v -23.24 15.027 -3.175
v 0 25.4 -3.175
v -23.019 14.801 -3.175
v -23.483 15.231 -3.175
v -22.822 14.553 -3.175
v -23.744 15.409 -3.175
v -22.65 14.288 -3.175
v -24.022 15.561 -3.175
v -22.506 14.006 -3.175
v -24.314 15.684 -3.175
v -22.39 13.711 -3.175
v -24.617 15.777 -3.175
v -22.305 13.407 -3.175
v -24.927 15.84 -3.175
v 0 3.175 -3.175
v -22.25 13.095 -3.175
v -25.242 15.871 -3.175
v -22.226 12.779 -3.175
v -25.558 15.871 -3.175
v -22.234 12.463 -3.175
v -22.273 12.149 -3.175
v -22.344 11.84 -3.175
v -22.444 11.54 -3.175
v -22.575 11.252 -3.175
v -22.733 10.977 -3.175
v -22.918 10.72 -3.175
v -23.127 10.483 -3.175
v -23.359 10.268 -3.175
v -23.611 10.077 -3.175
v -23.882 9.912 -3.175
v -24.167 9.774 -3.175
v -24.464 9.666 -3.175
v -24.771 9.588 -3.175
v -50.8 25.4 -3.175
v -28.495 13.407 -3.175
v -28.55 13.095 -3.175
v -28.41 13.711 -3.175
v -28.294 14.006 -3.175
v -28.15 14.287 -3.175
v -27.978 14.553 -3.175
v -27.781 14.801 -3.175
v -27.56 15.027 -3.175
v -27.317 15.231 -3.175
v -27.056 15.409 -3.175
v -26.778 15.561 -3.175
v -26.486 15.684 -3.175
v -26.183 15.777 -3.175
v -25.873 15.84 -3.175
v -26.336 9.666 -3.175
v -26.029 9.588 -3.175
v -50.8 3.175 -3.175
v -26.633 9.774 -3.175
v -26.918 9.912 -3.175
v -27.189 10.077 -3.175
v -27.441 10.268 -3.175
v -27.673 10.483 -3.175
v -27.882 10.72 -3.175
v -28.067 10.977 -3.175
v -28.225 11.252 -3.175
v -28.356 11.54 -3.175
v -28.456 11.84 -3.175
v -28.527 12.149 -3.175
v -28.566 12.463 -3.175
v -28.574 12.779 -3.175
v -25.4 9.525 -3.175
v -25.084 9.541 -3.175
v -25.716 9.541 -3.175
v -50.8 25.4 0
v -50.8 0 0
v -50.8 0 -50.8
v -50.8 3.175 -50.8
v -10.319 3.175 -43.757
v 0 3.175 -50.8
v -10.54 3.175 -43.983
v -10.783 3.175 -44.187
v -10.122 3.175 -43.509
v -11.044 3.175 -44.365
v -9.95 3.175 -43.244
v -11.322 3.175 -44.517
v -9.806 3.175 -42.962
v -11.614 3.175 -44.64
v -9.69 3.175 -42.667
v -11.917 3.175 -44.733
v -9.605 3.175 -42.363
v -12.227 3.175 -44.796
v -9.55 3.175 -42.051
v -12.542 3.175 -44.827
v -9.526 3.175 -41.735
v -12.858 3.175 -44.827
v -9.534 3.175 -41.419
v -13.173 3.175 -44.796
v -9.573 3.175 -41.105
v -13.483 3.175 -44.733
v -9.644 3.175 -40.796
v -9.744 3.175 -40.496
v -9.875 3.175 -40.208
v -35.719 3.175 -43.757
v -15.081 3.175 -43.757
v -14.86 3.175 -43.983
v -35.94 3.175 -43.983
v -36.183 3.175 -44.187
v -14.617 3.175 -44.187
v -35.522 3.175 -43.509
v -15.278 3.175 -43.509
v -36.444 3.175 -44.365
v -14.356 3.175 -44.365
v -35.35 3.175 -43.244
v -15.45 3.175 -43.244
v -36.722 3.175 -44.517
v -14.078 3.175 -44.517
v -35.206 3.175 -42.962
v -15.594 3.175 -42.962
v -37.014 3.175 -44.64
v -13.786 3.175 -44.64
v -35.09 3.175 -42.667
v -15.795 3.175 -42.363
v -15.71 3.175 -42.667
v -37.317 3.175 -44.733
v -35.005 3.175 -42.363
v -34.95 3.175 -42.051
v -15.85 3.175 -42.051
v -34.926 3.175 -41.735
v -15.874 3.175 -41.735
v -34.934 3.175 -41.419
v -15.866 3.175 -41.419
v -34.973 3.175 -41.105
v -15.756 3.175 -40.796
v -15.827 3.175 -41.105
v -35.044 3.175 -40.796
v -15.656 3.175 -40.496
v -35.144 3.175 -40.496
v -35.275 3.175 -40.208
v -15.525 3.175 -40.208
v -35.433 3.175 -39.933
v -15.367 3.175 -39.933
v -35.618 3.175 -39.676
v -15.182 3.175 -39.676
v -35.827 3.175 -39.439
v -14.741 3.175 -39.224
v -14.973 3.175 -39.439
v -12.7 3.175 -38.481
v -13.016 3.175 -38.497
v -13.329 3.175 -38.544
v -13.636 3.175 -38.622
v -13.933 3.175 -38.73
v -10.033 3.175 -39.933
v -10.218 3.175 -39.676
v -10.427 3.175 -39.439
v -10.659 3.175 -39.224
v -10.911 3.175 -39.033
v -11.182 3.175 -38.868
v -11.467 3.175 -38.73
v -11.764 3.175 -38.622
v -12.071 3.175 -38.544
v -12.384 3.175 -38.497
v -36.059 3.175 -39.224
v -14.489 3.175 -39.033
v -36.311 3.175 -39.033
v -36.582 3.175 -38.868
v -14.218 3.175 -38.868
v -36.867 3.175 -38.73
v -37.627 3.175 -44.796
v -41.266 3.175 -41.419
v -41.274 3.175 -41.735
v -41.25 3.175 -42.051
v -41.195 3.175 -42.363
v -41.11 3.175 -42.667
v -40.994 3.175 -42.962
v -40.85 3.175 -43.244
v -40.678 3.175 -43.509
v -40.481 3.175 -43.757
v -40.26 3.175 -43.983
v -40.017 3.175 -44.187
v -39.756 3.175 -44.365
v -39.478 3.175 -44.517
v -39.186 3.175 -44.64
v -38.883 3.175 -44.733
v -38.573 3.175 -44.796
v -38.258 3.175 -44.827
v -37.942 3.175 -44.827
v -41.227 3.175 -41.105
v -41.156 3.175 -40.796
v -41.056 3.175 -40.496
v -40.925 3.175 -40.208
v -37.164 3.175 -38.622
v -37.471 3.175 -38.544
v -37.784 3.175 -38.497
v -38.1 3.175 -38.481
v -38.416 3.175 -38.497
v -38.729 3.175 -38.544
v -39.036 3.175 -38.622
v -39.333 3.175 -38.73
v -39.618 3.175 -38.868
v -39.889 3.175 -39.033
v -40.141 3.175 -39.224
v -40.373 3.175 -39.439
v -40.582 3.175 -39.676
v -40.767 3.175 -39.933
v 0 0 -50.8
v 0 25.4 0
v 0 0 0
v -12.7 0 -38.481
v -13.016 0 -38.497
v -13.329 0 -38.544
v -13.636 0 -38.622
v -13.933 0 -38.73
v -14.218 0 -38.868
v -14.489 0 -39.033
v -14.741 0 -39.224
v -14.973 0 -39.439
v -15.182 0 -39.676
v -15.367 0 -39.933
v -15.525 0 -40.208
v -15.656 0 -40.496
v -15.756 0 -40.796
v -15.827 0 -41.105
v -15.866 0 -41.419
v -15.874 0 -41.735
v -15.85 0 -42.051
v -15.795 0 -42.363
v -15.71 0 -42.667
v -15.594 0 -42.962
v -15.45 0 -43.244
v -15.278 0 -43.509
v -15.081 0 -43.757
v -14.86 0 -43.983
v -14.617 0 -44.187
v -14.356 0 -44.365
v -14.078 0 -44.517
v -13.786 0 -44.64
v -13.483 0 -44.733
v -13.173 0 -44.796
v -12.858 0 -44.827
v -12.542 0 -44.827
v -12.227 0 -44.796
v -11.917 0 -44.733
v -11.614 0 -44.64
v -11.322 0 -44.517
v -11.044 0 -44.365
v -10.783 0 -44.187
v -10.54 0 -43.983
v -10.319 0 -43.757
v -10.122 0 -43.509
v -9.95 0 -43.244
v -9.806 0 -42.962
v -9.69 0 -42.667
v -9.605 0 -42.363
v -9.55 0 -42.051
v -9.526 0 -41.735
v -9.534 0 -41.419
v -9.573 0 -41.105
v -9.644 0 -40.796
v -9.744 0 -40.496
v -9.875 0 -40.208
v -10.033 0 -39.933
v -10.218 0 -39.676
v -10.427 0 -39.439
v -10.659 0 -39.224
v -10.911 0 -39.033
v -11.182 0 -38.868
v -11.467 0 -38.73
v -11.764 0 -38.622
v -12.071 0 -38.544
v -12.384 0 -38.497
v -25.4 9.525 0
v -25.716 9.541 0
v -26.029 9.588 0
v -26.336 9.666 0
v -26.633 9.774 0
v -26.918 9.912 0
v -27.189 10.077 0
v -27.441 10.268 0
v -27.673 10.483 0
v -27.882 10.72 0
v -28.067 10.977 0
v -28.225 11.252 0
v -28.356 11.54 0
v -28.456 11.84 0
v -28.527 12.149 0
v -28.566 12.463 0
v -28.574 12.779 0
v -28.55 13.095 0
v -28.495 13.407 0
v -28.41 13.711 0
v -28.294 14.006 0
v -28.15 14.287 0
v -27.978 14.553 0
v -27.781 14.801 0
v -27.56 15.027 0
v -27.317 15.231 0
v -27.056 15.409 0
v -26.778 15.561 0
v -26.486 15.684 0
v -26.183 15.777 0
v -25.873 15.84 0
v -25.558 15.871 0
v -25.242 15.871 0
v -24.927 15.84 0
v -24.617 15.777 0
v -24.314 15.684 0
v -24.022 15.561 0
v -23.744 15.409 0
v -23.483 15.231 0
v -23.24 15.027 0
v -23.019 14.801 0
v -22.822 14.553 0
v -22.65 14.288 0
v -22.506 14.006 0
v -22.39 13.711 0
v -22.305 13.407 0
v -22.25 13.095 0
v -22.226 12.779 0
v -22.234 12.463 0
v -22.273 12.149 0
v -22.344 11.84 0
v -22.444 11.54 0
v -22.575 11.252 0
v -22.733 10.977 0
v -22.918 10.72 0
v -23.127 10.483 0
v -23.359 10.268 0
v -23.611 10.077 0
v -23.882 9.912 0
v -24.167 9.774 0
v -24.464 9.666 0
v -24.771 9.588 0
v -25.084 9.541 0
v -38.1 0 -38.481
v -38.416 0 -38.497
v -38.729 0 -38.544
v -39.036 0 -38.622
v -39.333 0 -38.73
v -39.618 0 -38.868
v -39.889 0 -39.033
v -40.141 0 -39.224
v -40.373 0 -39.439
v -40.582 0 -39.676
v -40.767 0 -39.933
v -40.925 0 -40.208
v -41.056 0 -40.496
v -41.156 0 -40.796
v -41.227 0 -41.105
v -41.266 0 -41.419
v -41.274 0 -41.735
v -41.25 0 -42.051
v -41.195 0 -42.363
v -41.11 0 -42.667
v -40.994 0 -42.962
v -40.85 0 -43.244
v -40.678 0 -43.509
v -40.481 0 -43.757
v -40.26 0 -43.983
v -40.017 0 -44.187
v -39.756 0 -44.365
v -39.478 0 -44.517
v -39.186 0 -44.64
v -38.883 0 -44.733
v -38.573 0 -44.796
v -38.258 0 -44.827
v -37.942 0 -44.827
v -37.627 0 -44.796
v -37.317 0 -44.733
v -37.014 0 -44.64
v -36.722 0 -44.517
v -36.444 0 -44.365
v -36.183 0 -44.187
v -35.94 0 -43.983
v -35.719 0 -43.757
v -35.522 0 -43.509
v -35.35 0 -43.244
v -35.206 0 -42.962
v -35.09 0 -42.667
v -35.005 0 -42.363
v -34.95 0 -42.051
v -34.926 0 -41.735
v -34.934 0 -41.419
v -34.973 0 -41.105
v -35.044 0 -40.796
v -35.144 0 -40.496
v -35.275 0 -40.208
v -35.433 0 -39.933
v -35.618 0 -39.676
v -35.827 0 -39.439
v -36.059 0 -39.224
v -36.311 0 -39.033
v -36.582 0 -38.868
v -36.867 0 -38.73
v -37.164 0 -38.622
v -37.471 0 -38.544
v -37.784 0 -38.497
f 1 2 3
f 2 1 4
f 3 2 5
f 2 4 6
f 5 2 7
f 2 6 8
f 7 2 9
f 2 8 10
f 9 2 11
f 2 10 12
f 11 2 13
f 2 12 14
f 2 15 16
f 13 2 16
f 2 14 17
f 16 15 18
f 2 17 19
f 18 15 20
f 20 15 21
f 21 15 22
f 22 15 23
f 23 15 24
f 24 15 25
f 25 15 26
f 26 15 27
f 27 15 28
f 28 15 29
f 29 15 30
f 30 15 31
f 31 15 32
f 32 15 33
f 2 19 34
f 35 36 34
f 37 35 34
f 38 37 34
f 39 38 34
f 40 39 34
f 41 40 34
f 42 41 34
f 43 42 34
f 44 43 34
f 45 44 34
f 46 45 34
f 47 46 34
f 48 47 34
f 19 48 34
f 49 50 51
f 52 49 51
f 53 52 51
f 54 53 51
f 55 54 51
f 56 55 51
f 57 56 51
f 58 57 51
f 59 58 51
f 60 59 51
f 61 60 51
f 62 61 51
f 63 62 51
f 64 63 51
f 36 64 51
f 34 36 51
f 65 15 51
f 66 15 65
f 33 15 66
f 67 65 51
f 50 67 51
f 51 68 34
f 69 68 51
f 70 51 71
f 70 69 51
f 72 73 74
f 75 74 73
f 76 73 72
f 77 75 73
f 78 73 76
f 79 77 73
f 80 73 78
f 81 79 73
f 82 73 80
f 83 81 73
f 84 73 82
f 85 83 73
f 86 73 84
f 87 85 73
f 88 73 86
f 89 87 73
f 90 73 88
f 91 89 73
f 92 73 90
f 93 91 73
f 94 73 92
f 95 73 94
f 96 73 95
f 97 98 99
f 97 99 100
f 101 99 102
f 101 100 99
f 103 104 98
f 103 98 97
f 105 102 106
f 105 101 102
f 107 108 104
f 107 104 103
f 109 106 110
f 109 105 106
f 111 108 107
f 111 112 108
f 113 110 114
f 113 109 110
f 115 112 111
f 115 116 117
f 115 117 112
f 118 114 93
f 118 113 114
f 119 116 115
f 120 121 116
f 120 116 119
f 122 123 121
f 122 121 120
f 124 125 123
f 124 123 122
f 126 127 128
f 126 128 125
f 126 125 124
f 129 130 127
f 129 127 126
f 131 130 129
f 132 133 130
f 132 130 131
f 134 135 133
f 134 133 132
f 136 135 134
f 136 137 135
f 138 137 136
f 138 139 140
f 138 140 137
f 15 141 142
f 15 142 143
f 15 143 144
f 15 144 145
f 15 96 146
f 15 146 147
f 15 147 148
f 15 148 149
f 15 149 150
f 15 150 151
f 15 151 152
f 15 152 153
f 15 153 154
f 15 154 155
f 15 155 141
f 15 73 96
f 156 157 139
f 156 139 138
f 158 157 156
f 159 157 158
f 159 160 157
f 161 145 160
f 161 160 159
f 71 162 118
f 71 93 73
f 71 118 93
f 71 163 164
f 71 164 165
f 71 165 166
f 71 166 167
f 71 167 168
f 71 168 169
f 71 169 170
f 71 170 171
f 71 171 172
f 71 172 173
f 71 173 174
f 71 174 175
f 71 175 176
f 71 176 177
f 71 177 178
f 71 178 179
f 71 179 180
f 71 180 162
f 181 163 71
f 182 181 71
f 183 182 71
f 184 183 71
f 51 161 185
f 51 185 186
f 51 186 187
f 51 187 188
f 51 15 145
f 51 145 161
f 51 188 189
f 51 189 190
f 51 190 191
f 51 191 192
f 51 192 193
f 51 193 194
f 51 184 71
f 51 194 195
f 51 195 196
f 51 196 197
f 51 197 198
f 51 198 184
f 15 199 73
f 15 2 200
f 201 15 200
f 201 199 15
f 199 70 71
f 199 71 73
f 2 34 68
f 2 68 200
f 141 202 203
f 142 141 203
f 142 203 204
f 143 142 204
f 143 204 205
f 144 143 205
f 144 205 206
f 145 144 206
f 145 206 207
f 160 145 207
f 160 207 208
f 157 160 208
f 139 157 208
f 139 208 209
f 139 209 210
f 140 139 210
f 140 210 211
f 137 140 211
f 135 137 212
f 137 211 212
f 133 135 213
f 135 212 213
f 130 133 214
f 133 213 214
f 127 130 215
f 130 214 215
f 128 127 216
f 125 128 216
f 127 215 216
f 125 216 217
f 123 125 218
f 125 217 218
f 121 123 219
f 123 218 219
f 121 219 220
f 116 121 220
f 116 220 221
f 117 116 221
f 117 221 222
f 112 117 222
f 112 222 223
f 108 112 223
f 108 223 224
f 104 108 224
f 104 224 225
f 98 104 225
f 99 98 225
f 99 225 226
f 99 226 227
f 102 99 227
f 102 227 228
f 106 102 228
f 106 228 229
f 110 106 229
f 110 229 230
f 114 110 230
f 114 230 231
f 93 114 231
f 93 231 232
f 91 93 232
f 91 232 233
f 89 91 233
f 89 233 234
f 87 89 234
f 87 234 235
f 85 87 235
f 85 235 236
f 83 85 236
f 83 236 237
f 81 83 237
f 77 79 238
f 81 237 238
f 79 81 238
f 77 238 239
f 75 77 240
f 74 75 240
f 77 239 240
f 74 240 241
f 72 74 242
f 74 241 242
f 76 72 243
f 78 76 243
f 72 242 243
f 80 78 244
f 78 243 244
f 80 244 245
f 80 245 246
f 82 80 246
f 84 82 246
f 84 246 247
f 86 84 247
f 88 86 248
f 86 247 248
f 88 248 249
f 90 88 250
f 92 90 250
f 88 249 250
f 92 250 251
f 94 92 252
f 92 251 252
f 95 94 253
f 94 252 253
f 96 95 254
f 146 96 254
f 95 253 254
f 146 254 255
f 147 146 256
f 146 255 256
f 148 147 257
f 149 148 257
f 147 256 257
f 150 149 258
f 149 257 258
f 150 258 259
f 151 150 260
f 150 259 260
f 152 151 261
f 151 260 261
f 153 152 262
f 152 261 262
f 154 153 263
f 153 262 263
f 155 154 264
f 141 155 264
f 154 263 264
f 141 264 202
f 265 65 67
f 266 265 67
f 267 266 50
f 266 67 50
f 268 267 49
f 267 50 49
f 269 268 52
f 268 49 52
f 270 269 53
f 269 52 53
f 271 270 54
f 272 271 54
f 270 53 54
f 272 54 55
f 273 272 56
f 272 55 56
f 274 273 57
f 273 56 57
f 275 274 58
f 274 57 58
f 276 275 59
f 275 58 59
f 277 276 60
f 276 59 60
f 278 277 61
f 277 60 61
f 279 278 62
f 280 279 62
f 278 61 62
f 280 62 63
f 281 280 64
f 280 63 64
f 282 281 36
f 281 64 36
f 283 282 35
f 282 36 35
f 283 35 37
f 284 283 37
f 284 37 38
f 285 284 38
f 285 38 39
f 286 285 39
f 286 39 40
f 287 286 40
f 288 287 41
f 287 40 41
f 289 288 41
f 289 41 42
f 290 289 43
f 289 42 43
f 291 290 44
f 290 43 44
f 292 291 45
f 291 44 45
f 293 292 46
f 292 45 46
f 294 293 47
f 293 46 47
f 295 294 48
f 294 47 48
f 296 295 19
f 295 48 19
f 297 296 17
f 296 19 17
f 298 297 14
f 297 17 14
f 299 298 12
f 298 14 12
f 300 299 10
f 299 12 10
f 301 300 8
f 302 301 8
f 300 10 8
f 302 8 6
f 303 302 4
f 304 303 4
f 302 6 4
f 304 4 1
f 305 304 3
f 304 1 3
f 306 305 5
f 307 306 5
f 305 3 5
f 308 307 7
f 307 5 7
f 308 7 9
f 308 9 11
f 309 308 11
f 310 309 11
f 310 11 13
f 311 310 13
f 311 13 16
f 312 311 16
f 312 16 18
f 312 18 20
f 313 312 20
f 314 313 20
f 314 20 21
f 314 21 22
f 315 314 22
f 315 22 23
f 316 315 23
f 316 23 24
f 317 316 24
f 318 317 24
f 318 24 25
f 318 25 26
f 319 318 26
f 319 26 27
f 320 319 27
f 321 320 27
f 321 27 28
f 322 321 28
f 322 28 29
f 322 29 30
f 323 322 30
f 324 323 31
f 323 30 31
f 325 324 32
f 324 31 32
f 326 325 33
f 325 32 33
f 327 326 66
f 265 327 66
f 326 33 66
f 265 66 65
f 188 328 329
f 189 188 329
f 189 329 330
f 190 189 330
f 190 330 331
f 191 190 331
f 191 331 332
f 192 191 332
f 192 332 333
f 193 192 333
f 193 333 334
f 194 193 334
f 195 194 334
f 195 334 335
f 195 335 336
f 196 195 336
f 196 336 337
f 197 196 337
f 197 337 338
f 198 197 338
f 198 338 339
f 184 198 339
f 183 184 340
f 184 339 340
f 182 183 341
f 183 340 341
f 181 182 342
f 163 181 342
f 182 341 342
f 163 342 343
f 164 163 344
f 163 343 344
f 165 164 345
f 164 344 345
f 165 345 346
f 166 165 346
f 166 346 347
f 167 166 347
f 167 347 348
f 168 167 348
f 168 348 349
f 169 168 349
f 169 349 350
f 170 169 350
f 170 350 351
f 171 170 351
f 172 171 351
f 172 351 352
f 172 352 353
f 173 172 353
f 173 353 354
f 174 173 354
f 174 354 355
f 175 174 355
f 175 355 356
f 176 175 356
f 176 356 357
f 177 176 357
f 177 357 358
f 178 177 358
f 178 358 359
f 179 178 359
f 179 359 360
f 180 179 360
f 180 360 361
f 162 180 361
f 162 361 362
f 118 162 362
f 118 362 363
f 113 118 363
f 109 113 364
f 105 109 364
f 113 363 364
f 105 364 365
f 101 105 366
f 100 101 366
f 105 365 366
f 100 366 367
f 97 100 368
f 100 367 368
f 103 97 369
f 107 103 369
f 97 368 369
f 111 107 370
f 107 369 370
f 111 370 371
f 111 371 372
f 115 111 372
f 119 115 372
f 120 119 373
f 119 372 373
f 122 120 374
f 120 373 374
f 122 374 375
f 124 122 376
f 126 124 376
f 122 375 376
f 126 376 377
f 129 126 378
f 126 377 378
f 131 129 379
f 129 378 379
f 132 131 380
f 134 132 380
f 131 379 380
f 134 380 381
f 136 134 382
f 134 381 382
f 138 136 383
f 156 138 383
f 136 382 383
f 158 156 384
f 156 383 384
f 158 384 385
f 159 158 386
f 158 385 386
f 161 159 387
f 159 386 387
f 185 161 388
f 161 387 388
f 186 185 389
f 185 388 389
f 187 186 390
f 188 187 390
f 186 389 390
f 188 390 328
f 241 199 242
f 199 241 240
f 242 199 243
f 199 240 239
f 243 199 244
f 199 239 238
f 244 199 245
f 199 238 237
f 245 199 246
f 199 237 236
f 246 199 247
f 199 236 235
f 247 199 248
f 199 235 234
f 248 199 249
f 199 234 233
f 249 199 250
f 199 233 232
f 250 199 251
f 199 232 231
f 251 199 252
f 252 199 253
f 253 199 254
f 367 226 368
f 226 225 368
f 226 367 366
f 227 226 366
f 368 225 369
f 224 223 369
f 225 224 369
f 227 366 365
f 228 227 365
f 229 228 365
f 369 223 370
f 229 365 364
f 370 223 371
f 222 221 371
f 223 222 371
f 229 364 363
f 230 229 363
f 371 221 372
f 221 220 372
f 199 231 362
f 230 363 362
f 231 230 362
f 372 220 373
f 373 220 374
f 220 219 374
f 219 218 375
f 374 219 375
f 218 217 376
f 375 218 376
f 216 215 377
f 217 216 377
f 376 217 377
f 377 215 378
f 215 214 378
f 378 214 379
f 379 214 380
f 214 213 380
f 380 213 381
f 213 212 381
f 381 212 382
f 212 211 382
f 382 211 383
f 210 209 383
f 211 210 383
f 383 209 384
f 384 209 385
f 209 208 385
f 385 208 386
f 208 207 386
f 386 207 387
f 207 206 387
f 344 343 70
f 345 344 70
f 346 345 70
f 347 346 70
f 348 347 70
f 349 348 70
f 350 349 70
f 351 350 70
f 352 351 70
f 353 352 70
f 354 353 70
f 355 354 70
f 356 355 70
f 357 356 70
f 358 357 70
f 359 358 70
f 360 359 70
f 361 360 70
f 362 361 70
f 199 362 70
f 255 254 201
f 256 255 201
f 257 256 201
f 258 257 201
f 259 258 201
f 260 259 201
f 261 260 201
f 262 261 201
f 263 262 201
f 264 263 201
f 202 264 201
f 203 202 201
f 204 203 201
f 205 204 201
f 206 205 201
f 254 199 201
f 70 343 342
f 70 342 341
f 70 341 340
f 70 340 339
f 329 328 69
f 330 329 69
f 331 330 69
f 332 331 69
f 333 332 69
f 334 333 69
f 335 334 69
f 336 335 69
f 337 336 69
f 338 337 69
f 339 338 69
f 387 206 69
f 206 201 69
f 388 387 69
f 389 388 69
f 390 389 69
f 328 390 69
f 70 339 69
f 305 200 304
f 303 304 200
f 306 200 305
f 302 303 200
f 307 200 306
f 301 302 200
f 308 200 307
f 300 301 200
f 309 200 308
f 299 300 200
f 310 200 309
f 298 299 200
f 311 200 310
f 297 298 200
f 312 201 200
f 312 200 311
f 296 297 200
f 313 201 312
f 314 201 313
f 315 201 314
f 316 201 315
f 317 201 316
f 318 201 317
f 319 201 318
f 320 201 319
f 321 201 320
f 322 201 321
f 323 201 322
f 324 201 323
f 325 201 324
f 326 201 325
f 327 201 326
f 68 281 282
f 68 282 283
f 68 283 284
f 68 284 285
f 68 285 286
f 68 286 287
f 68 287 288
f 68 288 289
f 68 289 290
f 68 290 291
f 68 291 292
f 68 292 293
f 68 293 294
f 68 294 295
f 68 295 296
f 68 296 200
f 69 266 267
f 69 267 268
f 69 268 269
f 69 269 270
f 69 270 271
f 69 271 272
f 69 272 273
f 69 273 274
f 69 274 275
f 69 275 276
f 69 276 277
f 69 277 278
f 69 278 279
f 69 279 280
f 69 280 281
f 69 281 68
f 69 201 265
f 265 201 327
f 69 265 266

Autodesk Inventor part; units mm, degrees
ref_plane "YZ Plane" through (0, 0, 0) normal (1, 0, 0) x (0, 1, 0)
ref_plane "XZ Plane" through (0, 0, 0) normal (0, 1, 0) x (-1, 0, 0)
ref_plane "XY Plane" through (0, 0, 0) normal (0, 0, 1) x (1, 0, 0)
sketch "Sketch1" plane through (0, 0, 0) normal (0, 1, 0) x (-1, 0, 0)
  line L0 (0, 0) -> (50.8, 0)
  line L1 (50.8, 0) -> (50.8, -50.8)
  line L2 (50.8, -50.8) -> (0, -50.8)
  line L3 (0, -50.8) -> (0, 0)
  dimension "d0" = 50.8
  dimension "d1" = 50.8
extrude "Extrusion1" add sketch "Sketch1" along normal blind 3.175
sketch "Sketch2" plane through (0, 3.175, 0) normal (0, 1, 0) x (1, 0, 0)
  line L0 (-50.8, 0) -> (0, 0) projected
  line L1 (0, 0) -> (0, 50.8) projected
  line L2 (-50.8, 0) -> (0, 0)
  line L3 (0, 0) -> (0, 3.175)
  line L4 (0, 3.175) -> (-50.8, 3.175)
  line L5 (-50.8, 3.175) -> (-50.8, 0)
  dimension "d4" = 3.175
extrude "Extrusion2" add sketch "Sketch2" along normal blind 22.225
sketch "Sketch3" plane through (0, 3.175, 0) normal (0, 1, 0) x (1, 0, 0)
  line L0 (0, 3.175) -> (0, 50.8) projected
  line L1 (-50.8, 50.8) -> (-50.8, 3.175) projected
  line L2 (0, 50.8) -> (-50.8, 50.8) projected
  point P0 (0, 0)
  point P1 (-12.7, 41.656)
  point P2 (-38.1, 41.656)
  dimension "d9" = 9.144
  dimension "d10" = 9.144
  dimension "d18" = 25.4
  dimension "d19" = 12.7
  dimension "d20" = 12.7
  dimension "d21" = 50.8
hole "Hole1" at (-12.7, 3.175, -41.656) at (-38.1, 3.175, -41.656) direction (0, -1, 0) diameter 6.35 depth 25.4 tip angle 118
sketch "Sketch5" plane through (-50.8, 0, 0) normal (0, 0, 1) x (1, 0, 0)
  line L0 (0, 25.4) -> (50.8, 25.4) projected
  line L1 (50.8, 0) -> (50.8, 25.4) projected
  point P0 (25.4, 12.7)
  dimension "d23" = 12.7
  dimension "d24" = 25.4
hole "Hole2" at (-25.4, 12.7, 0) direction (0, 0, -1) diameter 6.35 end through all
equation "\"d10\" = d9"
equation "\"d19\" = -0.5 * d18 + 0.5 * d21"
properties part number "improved transmission bracket"
